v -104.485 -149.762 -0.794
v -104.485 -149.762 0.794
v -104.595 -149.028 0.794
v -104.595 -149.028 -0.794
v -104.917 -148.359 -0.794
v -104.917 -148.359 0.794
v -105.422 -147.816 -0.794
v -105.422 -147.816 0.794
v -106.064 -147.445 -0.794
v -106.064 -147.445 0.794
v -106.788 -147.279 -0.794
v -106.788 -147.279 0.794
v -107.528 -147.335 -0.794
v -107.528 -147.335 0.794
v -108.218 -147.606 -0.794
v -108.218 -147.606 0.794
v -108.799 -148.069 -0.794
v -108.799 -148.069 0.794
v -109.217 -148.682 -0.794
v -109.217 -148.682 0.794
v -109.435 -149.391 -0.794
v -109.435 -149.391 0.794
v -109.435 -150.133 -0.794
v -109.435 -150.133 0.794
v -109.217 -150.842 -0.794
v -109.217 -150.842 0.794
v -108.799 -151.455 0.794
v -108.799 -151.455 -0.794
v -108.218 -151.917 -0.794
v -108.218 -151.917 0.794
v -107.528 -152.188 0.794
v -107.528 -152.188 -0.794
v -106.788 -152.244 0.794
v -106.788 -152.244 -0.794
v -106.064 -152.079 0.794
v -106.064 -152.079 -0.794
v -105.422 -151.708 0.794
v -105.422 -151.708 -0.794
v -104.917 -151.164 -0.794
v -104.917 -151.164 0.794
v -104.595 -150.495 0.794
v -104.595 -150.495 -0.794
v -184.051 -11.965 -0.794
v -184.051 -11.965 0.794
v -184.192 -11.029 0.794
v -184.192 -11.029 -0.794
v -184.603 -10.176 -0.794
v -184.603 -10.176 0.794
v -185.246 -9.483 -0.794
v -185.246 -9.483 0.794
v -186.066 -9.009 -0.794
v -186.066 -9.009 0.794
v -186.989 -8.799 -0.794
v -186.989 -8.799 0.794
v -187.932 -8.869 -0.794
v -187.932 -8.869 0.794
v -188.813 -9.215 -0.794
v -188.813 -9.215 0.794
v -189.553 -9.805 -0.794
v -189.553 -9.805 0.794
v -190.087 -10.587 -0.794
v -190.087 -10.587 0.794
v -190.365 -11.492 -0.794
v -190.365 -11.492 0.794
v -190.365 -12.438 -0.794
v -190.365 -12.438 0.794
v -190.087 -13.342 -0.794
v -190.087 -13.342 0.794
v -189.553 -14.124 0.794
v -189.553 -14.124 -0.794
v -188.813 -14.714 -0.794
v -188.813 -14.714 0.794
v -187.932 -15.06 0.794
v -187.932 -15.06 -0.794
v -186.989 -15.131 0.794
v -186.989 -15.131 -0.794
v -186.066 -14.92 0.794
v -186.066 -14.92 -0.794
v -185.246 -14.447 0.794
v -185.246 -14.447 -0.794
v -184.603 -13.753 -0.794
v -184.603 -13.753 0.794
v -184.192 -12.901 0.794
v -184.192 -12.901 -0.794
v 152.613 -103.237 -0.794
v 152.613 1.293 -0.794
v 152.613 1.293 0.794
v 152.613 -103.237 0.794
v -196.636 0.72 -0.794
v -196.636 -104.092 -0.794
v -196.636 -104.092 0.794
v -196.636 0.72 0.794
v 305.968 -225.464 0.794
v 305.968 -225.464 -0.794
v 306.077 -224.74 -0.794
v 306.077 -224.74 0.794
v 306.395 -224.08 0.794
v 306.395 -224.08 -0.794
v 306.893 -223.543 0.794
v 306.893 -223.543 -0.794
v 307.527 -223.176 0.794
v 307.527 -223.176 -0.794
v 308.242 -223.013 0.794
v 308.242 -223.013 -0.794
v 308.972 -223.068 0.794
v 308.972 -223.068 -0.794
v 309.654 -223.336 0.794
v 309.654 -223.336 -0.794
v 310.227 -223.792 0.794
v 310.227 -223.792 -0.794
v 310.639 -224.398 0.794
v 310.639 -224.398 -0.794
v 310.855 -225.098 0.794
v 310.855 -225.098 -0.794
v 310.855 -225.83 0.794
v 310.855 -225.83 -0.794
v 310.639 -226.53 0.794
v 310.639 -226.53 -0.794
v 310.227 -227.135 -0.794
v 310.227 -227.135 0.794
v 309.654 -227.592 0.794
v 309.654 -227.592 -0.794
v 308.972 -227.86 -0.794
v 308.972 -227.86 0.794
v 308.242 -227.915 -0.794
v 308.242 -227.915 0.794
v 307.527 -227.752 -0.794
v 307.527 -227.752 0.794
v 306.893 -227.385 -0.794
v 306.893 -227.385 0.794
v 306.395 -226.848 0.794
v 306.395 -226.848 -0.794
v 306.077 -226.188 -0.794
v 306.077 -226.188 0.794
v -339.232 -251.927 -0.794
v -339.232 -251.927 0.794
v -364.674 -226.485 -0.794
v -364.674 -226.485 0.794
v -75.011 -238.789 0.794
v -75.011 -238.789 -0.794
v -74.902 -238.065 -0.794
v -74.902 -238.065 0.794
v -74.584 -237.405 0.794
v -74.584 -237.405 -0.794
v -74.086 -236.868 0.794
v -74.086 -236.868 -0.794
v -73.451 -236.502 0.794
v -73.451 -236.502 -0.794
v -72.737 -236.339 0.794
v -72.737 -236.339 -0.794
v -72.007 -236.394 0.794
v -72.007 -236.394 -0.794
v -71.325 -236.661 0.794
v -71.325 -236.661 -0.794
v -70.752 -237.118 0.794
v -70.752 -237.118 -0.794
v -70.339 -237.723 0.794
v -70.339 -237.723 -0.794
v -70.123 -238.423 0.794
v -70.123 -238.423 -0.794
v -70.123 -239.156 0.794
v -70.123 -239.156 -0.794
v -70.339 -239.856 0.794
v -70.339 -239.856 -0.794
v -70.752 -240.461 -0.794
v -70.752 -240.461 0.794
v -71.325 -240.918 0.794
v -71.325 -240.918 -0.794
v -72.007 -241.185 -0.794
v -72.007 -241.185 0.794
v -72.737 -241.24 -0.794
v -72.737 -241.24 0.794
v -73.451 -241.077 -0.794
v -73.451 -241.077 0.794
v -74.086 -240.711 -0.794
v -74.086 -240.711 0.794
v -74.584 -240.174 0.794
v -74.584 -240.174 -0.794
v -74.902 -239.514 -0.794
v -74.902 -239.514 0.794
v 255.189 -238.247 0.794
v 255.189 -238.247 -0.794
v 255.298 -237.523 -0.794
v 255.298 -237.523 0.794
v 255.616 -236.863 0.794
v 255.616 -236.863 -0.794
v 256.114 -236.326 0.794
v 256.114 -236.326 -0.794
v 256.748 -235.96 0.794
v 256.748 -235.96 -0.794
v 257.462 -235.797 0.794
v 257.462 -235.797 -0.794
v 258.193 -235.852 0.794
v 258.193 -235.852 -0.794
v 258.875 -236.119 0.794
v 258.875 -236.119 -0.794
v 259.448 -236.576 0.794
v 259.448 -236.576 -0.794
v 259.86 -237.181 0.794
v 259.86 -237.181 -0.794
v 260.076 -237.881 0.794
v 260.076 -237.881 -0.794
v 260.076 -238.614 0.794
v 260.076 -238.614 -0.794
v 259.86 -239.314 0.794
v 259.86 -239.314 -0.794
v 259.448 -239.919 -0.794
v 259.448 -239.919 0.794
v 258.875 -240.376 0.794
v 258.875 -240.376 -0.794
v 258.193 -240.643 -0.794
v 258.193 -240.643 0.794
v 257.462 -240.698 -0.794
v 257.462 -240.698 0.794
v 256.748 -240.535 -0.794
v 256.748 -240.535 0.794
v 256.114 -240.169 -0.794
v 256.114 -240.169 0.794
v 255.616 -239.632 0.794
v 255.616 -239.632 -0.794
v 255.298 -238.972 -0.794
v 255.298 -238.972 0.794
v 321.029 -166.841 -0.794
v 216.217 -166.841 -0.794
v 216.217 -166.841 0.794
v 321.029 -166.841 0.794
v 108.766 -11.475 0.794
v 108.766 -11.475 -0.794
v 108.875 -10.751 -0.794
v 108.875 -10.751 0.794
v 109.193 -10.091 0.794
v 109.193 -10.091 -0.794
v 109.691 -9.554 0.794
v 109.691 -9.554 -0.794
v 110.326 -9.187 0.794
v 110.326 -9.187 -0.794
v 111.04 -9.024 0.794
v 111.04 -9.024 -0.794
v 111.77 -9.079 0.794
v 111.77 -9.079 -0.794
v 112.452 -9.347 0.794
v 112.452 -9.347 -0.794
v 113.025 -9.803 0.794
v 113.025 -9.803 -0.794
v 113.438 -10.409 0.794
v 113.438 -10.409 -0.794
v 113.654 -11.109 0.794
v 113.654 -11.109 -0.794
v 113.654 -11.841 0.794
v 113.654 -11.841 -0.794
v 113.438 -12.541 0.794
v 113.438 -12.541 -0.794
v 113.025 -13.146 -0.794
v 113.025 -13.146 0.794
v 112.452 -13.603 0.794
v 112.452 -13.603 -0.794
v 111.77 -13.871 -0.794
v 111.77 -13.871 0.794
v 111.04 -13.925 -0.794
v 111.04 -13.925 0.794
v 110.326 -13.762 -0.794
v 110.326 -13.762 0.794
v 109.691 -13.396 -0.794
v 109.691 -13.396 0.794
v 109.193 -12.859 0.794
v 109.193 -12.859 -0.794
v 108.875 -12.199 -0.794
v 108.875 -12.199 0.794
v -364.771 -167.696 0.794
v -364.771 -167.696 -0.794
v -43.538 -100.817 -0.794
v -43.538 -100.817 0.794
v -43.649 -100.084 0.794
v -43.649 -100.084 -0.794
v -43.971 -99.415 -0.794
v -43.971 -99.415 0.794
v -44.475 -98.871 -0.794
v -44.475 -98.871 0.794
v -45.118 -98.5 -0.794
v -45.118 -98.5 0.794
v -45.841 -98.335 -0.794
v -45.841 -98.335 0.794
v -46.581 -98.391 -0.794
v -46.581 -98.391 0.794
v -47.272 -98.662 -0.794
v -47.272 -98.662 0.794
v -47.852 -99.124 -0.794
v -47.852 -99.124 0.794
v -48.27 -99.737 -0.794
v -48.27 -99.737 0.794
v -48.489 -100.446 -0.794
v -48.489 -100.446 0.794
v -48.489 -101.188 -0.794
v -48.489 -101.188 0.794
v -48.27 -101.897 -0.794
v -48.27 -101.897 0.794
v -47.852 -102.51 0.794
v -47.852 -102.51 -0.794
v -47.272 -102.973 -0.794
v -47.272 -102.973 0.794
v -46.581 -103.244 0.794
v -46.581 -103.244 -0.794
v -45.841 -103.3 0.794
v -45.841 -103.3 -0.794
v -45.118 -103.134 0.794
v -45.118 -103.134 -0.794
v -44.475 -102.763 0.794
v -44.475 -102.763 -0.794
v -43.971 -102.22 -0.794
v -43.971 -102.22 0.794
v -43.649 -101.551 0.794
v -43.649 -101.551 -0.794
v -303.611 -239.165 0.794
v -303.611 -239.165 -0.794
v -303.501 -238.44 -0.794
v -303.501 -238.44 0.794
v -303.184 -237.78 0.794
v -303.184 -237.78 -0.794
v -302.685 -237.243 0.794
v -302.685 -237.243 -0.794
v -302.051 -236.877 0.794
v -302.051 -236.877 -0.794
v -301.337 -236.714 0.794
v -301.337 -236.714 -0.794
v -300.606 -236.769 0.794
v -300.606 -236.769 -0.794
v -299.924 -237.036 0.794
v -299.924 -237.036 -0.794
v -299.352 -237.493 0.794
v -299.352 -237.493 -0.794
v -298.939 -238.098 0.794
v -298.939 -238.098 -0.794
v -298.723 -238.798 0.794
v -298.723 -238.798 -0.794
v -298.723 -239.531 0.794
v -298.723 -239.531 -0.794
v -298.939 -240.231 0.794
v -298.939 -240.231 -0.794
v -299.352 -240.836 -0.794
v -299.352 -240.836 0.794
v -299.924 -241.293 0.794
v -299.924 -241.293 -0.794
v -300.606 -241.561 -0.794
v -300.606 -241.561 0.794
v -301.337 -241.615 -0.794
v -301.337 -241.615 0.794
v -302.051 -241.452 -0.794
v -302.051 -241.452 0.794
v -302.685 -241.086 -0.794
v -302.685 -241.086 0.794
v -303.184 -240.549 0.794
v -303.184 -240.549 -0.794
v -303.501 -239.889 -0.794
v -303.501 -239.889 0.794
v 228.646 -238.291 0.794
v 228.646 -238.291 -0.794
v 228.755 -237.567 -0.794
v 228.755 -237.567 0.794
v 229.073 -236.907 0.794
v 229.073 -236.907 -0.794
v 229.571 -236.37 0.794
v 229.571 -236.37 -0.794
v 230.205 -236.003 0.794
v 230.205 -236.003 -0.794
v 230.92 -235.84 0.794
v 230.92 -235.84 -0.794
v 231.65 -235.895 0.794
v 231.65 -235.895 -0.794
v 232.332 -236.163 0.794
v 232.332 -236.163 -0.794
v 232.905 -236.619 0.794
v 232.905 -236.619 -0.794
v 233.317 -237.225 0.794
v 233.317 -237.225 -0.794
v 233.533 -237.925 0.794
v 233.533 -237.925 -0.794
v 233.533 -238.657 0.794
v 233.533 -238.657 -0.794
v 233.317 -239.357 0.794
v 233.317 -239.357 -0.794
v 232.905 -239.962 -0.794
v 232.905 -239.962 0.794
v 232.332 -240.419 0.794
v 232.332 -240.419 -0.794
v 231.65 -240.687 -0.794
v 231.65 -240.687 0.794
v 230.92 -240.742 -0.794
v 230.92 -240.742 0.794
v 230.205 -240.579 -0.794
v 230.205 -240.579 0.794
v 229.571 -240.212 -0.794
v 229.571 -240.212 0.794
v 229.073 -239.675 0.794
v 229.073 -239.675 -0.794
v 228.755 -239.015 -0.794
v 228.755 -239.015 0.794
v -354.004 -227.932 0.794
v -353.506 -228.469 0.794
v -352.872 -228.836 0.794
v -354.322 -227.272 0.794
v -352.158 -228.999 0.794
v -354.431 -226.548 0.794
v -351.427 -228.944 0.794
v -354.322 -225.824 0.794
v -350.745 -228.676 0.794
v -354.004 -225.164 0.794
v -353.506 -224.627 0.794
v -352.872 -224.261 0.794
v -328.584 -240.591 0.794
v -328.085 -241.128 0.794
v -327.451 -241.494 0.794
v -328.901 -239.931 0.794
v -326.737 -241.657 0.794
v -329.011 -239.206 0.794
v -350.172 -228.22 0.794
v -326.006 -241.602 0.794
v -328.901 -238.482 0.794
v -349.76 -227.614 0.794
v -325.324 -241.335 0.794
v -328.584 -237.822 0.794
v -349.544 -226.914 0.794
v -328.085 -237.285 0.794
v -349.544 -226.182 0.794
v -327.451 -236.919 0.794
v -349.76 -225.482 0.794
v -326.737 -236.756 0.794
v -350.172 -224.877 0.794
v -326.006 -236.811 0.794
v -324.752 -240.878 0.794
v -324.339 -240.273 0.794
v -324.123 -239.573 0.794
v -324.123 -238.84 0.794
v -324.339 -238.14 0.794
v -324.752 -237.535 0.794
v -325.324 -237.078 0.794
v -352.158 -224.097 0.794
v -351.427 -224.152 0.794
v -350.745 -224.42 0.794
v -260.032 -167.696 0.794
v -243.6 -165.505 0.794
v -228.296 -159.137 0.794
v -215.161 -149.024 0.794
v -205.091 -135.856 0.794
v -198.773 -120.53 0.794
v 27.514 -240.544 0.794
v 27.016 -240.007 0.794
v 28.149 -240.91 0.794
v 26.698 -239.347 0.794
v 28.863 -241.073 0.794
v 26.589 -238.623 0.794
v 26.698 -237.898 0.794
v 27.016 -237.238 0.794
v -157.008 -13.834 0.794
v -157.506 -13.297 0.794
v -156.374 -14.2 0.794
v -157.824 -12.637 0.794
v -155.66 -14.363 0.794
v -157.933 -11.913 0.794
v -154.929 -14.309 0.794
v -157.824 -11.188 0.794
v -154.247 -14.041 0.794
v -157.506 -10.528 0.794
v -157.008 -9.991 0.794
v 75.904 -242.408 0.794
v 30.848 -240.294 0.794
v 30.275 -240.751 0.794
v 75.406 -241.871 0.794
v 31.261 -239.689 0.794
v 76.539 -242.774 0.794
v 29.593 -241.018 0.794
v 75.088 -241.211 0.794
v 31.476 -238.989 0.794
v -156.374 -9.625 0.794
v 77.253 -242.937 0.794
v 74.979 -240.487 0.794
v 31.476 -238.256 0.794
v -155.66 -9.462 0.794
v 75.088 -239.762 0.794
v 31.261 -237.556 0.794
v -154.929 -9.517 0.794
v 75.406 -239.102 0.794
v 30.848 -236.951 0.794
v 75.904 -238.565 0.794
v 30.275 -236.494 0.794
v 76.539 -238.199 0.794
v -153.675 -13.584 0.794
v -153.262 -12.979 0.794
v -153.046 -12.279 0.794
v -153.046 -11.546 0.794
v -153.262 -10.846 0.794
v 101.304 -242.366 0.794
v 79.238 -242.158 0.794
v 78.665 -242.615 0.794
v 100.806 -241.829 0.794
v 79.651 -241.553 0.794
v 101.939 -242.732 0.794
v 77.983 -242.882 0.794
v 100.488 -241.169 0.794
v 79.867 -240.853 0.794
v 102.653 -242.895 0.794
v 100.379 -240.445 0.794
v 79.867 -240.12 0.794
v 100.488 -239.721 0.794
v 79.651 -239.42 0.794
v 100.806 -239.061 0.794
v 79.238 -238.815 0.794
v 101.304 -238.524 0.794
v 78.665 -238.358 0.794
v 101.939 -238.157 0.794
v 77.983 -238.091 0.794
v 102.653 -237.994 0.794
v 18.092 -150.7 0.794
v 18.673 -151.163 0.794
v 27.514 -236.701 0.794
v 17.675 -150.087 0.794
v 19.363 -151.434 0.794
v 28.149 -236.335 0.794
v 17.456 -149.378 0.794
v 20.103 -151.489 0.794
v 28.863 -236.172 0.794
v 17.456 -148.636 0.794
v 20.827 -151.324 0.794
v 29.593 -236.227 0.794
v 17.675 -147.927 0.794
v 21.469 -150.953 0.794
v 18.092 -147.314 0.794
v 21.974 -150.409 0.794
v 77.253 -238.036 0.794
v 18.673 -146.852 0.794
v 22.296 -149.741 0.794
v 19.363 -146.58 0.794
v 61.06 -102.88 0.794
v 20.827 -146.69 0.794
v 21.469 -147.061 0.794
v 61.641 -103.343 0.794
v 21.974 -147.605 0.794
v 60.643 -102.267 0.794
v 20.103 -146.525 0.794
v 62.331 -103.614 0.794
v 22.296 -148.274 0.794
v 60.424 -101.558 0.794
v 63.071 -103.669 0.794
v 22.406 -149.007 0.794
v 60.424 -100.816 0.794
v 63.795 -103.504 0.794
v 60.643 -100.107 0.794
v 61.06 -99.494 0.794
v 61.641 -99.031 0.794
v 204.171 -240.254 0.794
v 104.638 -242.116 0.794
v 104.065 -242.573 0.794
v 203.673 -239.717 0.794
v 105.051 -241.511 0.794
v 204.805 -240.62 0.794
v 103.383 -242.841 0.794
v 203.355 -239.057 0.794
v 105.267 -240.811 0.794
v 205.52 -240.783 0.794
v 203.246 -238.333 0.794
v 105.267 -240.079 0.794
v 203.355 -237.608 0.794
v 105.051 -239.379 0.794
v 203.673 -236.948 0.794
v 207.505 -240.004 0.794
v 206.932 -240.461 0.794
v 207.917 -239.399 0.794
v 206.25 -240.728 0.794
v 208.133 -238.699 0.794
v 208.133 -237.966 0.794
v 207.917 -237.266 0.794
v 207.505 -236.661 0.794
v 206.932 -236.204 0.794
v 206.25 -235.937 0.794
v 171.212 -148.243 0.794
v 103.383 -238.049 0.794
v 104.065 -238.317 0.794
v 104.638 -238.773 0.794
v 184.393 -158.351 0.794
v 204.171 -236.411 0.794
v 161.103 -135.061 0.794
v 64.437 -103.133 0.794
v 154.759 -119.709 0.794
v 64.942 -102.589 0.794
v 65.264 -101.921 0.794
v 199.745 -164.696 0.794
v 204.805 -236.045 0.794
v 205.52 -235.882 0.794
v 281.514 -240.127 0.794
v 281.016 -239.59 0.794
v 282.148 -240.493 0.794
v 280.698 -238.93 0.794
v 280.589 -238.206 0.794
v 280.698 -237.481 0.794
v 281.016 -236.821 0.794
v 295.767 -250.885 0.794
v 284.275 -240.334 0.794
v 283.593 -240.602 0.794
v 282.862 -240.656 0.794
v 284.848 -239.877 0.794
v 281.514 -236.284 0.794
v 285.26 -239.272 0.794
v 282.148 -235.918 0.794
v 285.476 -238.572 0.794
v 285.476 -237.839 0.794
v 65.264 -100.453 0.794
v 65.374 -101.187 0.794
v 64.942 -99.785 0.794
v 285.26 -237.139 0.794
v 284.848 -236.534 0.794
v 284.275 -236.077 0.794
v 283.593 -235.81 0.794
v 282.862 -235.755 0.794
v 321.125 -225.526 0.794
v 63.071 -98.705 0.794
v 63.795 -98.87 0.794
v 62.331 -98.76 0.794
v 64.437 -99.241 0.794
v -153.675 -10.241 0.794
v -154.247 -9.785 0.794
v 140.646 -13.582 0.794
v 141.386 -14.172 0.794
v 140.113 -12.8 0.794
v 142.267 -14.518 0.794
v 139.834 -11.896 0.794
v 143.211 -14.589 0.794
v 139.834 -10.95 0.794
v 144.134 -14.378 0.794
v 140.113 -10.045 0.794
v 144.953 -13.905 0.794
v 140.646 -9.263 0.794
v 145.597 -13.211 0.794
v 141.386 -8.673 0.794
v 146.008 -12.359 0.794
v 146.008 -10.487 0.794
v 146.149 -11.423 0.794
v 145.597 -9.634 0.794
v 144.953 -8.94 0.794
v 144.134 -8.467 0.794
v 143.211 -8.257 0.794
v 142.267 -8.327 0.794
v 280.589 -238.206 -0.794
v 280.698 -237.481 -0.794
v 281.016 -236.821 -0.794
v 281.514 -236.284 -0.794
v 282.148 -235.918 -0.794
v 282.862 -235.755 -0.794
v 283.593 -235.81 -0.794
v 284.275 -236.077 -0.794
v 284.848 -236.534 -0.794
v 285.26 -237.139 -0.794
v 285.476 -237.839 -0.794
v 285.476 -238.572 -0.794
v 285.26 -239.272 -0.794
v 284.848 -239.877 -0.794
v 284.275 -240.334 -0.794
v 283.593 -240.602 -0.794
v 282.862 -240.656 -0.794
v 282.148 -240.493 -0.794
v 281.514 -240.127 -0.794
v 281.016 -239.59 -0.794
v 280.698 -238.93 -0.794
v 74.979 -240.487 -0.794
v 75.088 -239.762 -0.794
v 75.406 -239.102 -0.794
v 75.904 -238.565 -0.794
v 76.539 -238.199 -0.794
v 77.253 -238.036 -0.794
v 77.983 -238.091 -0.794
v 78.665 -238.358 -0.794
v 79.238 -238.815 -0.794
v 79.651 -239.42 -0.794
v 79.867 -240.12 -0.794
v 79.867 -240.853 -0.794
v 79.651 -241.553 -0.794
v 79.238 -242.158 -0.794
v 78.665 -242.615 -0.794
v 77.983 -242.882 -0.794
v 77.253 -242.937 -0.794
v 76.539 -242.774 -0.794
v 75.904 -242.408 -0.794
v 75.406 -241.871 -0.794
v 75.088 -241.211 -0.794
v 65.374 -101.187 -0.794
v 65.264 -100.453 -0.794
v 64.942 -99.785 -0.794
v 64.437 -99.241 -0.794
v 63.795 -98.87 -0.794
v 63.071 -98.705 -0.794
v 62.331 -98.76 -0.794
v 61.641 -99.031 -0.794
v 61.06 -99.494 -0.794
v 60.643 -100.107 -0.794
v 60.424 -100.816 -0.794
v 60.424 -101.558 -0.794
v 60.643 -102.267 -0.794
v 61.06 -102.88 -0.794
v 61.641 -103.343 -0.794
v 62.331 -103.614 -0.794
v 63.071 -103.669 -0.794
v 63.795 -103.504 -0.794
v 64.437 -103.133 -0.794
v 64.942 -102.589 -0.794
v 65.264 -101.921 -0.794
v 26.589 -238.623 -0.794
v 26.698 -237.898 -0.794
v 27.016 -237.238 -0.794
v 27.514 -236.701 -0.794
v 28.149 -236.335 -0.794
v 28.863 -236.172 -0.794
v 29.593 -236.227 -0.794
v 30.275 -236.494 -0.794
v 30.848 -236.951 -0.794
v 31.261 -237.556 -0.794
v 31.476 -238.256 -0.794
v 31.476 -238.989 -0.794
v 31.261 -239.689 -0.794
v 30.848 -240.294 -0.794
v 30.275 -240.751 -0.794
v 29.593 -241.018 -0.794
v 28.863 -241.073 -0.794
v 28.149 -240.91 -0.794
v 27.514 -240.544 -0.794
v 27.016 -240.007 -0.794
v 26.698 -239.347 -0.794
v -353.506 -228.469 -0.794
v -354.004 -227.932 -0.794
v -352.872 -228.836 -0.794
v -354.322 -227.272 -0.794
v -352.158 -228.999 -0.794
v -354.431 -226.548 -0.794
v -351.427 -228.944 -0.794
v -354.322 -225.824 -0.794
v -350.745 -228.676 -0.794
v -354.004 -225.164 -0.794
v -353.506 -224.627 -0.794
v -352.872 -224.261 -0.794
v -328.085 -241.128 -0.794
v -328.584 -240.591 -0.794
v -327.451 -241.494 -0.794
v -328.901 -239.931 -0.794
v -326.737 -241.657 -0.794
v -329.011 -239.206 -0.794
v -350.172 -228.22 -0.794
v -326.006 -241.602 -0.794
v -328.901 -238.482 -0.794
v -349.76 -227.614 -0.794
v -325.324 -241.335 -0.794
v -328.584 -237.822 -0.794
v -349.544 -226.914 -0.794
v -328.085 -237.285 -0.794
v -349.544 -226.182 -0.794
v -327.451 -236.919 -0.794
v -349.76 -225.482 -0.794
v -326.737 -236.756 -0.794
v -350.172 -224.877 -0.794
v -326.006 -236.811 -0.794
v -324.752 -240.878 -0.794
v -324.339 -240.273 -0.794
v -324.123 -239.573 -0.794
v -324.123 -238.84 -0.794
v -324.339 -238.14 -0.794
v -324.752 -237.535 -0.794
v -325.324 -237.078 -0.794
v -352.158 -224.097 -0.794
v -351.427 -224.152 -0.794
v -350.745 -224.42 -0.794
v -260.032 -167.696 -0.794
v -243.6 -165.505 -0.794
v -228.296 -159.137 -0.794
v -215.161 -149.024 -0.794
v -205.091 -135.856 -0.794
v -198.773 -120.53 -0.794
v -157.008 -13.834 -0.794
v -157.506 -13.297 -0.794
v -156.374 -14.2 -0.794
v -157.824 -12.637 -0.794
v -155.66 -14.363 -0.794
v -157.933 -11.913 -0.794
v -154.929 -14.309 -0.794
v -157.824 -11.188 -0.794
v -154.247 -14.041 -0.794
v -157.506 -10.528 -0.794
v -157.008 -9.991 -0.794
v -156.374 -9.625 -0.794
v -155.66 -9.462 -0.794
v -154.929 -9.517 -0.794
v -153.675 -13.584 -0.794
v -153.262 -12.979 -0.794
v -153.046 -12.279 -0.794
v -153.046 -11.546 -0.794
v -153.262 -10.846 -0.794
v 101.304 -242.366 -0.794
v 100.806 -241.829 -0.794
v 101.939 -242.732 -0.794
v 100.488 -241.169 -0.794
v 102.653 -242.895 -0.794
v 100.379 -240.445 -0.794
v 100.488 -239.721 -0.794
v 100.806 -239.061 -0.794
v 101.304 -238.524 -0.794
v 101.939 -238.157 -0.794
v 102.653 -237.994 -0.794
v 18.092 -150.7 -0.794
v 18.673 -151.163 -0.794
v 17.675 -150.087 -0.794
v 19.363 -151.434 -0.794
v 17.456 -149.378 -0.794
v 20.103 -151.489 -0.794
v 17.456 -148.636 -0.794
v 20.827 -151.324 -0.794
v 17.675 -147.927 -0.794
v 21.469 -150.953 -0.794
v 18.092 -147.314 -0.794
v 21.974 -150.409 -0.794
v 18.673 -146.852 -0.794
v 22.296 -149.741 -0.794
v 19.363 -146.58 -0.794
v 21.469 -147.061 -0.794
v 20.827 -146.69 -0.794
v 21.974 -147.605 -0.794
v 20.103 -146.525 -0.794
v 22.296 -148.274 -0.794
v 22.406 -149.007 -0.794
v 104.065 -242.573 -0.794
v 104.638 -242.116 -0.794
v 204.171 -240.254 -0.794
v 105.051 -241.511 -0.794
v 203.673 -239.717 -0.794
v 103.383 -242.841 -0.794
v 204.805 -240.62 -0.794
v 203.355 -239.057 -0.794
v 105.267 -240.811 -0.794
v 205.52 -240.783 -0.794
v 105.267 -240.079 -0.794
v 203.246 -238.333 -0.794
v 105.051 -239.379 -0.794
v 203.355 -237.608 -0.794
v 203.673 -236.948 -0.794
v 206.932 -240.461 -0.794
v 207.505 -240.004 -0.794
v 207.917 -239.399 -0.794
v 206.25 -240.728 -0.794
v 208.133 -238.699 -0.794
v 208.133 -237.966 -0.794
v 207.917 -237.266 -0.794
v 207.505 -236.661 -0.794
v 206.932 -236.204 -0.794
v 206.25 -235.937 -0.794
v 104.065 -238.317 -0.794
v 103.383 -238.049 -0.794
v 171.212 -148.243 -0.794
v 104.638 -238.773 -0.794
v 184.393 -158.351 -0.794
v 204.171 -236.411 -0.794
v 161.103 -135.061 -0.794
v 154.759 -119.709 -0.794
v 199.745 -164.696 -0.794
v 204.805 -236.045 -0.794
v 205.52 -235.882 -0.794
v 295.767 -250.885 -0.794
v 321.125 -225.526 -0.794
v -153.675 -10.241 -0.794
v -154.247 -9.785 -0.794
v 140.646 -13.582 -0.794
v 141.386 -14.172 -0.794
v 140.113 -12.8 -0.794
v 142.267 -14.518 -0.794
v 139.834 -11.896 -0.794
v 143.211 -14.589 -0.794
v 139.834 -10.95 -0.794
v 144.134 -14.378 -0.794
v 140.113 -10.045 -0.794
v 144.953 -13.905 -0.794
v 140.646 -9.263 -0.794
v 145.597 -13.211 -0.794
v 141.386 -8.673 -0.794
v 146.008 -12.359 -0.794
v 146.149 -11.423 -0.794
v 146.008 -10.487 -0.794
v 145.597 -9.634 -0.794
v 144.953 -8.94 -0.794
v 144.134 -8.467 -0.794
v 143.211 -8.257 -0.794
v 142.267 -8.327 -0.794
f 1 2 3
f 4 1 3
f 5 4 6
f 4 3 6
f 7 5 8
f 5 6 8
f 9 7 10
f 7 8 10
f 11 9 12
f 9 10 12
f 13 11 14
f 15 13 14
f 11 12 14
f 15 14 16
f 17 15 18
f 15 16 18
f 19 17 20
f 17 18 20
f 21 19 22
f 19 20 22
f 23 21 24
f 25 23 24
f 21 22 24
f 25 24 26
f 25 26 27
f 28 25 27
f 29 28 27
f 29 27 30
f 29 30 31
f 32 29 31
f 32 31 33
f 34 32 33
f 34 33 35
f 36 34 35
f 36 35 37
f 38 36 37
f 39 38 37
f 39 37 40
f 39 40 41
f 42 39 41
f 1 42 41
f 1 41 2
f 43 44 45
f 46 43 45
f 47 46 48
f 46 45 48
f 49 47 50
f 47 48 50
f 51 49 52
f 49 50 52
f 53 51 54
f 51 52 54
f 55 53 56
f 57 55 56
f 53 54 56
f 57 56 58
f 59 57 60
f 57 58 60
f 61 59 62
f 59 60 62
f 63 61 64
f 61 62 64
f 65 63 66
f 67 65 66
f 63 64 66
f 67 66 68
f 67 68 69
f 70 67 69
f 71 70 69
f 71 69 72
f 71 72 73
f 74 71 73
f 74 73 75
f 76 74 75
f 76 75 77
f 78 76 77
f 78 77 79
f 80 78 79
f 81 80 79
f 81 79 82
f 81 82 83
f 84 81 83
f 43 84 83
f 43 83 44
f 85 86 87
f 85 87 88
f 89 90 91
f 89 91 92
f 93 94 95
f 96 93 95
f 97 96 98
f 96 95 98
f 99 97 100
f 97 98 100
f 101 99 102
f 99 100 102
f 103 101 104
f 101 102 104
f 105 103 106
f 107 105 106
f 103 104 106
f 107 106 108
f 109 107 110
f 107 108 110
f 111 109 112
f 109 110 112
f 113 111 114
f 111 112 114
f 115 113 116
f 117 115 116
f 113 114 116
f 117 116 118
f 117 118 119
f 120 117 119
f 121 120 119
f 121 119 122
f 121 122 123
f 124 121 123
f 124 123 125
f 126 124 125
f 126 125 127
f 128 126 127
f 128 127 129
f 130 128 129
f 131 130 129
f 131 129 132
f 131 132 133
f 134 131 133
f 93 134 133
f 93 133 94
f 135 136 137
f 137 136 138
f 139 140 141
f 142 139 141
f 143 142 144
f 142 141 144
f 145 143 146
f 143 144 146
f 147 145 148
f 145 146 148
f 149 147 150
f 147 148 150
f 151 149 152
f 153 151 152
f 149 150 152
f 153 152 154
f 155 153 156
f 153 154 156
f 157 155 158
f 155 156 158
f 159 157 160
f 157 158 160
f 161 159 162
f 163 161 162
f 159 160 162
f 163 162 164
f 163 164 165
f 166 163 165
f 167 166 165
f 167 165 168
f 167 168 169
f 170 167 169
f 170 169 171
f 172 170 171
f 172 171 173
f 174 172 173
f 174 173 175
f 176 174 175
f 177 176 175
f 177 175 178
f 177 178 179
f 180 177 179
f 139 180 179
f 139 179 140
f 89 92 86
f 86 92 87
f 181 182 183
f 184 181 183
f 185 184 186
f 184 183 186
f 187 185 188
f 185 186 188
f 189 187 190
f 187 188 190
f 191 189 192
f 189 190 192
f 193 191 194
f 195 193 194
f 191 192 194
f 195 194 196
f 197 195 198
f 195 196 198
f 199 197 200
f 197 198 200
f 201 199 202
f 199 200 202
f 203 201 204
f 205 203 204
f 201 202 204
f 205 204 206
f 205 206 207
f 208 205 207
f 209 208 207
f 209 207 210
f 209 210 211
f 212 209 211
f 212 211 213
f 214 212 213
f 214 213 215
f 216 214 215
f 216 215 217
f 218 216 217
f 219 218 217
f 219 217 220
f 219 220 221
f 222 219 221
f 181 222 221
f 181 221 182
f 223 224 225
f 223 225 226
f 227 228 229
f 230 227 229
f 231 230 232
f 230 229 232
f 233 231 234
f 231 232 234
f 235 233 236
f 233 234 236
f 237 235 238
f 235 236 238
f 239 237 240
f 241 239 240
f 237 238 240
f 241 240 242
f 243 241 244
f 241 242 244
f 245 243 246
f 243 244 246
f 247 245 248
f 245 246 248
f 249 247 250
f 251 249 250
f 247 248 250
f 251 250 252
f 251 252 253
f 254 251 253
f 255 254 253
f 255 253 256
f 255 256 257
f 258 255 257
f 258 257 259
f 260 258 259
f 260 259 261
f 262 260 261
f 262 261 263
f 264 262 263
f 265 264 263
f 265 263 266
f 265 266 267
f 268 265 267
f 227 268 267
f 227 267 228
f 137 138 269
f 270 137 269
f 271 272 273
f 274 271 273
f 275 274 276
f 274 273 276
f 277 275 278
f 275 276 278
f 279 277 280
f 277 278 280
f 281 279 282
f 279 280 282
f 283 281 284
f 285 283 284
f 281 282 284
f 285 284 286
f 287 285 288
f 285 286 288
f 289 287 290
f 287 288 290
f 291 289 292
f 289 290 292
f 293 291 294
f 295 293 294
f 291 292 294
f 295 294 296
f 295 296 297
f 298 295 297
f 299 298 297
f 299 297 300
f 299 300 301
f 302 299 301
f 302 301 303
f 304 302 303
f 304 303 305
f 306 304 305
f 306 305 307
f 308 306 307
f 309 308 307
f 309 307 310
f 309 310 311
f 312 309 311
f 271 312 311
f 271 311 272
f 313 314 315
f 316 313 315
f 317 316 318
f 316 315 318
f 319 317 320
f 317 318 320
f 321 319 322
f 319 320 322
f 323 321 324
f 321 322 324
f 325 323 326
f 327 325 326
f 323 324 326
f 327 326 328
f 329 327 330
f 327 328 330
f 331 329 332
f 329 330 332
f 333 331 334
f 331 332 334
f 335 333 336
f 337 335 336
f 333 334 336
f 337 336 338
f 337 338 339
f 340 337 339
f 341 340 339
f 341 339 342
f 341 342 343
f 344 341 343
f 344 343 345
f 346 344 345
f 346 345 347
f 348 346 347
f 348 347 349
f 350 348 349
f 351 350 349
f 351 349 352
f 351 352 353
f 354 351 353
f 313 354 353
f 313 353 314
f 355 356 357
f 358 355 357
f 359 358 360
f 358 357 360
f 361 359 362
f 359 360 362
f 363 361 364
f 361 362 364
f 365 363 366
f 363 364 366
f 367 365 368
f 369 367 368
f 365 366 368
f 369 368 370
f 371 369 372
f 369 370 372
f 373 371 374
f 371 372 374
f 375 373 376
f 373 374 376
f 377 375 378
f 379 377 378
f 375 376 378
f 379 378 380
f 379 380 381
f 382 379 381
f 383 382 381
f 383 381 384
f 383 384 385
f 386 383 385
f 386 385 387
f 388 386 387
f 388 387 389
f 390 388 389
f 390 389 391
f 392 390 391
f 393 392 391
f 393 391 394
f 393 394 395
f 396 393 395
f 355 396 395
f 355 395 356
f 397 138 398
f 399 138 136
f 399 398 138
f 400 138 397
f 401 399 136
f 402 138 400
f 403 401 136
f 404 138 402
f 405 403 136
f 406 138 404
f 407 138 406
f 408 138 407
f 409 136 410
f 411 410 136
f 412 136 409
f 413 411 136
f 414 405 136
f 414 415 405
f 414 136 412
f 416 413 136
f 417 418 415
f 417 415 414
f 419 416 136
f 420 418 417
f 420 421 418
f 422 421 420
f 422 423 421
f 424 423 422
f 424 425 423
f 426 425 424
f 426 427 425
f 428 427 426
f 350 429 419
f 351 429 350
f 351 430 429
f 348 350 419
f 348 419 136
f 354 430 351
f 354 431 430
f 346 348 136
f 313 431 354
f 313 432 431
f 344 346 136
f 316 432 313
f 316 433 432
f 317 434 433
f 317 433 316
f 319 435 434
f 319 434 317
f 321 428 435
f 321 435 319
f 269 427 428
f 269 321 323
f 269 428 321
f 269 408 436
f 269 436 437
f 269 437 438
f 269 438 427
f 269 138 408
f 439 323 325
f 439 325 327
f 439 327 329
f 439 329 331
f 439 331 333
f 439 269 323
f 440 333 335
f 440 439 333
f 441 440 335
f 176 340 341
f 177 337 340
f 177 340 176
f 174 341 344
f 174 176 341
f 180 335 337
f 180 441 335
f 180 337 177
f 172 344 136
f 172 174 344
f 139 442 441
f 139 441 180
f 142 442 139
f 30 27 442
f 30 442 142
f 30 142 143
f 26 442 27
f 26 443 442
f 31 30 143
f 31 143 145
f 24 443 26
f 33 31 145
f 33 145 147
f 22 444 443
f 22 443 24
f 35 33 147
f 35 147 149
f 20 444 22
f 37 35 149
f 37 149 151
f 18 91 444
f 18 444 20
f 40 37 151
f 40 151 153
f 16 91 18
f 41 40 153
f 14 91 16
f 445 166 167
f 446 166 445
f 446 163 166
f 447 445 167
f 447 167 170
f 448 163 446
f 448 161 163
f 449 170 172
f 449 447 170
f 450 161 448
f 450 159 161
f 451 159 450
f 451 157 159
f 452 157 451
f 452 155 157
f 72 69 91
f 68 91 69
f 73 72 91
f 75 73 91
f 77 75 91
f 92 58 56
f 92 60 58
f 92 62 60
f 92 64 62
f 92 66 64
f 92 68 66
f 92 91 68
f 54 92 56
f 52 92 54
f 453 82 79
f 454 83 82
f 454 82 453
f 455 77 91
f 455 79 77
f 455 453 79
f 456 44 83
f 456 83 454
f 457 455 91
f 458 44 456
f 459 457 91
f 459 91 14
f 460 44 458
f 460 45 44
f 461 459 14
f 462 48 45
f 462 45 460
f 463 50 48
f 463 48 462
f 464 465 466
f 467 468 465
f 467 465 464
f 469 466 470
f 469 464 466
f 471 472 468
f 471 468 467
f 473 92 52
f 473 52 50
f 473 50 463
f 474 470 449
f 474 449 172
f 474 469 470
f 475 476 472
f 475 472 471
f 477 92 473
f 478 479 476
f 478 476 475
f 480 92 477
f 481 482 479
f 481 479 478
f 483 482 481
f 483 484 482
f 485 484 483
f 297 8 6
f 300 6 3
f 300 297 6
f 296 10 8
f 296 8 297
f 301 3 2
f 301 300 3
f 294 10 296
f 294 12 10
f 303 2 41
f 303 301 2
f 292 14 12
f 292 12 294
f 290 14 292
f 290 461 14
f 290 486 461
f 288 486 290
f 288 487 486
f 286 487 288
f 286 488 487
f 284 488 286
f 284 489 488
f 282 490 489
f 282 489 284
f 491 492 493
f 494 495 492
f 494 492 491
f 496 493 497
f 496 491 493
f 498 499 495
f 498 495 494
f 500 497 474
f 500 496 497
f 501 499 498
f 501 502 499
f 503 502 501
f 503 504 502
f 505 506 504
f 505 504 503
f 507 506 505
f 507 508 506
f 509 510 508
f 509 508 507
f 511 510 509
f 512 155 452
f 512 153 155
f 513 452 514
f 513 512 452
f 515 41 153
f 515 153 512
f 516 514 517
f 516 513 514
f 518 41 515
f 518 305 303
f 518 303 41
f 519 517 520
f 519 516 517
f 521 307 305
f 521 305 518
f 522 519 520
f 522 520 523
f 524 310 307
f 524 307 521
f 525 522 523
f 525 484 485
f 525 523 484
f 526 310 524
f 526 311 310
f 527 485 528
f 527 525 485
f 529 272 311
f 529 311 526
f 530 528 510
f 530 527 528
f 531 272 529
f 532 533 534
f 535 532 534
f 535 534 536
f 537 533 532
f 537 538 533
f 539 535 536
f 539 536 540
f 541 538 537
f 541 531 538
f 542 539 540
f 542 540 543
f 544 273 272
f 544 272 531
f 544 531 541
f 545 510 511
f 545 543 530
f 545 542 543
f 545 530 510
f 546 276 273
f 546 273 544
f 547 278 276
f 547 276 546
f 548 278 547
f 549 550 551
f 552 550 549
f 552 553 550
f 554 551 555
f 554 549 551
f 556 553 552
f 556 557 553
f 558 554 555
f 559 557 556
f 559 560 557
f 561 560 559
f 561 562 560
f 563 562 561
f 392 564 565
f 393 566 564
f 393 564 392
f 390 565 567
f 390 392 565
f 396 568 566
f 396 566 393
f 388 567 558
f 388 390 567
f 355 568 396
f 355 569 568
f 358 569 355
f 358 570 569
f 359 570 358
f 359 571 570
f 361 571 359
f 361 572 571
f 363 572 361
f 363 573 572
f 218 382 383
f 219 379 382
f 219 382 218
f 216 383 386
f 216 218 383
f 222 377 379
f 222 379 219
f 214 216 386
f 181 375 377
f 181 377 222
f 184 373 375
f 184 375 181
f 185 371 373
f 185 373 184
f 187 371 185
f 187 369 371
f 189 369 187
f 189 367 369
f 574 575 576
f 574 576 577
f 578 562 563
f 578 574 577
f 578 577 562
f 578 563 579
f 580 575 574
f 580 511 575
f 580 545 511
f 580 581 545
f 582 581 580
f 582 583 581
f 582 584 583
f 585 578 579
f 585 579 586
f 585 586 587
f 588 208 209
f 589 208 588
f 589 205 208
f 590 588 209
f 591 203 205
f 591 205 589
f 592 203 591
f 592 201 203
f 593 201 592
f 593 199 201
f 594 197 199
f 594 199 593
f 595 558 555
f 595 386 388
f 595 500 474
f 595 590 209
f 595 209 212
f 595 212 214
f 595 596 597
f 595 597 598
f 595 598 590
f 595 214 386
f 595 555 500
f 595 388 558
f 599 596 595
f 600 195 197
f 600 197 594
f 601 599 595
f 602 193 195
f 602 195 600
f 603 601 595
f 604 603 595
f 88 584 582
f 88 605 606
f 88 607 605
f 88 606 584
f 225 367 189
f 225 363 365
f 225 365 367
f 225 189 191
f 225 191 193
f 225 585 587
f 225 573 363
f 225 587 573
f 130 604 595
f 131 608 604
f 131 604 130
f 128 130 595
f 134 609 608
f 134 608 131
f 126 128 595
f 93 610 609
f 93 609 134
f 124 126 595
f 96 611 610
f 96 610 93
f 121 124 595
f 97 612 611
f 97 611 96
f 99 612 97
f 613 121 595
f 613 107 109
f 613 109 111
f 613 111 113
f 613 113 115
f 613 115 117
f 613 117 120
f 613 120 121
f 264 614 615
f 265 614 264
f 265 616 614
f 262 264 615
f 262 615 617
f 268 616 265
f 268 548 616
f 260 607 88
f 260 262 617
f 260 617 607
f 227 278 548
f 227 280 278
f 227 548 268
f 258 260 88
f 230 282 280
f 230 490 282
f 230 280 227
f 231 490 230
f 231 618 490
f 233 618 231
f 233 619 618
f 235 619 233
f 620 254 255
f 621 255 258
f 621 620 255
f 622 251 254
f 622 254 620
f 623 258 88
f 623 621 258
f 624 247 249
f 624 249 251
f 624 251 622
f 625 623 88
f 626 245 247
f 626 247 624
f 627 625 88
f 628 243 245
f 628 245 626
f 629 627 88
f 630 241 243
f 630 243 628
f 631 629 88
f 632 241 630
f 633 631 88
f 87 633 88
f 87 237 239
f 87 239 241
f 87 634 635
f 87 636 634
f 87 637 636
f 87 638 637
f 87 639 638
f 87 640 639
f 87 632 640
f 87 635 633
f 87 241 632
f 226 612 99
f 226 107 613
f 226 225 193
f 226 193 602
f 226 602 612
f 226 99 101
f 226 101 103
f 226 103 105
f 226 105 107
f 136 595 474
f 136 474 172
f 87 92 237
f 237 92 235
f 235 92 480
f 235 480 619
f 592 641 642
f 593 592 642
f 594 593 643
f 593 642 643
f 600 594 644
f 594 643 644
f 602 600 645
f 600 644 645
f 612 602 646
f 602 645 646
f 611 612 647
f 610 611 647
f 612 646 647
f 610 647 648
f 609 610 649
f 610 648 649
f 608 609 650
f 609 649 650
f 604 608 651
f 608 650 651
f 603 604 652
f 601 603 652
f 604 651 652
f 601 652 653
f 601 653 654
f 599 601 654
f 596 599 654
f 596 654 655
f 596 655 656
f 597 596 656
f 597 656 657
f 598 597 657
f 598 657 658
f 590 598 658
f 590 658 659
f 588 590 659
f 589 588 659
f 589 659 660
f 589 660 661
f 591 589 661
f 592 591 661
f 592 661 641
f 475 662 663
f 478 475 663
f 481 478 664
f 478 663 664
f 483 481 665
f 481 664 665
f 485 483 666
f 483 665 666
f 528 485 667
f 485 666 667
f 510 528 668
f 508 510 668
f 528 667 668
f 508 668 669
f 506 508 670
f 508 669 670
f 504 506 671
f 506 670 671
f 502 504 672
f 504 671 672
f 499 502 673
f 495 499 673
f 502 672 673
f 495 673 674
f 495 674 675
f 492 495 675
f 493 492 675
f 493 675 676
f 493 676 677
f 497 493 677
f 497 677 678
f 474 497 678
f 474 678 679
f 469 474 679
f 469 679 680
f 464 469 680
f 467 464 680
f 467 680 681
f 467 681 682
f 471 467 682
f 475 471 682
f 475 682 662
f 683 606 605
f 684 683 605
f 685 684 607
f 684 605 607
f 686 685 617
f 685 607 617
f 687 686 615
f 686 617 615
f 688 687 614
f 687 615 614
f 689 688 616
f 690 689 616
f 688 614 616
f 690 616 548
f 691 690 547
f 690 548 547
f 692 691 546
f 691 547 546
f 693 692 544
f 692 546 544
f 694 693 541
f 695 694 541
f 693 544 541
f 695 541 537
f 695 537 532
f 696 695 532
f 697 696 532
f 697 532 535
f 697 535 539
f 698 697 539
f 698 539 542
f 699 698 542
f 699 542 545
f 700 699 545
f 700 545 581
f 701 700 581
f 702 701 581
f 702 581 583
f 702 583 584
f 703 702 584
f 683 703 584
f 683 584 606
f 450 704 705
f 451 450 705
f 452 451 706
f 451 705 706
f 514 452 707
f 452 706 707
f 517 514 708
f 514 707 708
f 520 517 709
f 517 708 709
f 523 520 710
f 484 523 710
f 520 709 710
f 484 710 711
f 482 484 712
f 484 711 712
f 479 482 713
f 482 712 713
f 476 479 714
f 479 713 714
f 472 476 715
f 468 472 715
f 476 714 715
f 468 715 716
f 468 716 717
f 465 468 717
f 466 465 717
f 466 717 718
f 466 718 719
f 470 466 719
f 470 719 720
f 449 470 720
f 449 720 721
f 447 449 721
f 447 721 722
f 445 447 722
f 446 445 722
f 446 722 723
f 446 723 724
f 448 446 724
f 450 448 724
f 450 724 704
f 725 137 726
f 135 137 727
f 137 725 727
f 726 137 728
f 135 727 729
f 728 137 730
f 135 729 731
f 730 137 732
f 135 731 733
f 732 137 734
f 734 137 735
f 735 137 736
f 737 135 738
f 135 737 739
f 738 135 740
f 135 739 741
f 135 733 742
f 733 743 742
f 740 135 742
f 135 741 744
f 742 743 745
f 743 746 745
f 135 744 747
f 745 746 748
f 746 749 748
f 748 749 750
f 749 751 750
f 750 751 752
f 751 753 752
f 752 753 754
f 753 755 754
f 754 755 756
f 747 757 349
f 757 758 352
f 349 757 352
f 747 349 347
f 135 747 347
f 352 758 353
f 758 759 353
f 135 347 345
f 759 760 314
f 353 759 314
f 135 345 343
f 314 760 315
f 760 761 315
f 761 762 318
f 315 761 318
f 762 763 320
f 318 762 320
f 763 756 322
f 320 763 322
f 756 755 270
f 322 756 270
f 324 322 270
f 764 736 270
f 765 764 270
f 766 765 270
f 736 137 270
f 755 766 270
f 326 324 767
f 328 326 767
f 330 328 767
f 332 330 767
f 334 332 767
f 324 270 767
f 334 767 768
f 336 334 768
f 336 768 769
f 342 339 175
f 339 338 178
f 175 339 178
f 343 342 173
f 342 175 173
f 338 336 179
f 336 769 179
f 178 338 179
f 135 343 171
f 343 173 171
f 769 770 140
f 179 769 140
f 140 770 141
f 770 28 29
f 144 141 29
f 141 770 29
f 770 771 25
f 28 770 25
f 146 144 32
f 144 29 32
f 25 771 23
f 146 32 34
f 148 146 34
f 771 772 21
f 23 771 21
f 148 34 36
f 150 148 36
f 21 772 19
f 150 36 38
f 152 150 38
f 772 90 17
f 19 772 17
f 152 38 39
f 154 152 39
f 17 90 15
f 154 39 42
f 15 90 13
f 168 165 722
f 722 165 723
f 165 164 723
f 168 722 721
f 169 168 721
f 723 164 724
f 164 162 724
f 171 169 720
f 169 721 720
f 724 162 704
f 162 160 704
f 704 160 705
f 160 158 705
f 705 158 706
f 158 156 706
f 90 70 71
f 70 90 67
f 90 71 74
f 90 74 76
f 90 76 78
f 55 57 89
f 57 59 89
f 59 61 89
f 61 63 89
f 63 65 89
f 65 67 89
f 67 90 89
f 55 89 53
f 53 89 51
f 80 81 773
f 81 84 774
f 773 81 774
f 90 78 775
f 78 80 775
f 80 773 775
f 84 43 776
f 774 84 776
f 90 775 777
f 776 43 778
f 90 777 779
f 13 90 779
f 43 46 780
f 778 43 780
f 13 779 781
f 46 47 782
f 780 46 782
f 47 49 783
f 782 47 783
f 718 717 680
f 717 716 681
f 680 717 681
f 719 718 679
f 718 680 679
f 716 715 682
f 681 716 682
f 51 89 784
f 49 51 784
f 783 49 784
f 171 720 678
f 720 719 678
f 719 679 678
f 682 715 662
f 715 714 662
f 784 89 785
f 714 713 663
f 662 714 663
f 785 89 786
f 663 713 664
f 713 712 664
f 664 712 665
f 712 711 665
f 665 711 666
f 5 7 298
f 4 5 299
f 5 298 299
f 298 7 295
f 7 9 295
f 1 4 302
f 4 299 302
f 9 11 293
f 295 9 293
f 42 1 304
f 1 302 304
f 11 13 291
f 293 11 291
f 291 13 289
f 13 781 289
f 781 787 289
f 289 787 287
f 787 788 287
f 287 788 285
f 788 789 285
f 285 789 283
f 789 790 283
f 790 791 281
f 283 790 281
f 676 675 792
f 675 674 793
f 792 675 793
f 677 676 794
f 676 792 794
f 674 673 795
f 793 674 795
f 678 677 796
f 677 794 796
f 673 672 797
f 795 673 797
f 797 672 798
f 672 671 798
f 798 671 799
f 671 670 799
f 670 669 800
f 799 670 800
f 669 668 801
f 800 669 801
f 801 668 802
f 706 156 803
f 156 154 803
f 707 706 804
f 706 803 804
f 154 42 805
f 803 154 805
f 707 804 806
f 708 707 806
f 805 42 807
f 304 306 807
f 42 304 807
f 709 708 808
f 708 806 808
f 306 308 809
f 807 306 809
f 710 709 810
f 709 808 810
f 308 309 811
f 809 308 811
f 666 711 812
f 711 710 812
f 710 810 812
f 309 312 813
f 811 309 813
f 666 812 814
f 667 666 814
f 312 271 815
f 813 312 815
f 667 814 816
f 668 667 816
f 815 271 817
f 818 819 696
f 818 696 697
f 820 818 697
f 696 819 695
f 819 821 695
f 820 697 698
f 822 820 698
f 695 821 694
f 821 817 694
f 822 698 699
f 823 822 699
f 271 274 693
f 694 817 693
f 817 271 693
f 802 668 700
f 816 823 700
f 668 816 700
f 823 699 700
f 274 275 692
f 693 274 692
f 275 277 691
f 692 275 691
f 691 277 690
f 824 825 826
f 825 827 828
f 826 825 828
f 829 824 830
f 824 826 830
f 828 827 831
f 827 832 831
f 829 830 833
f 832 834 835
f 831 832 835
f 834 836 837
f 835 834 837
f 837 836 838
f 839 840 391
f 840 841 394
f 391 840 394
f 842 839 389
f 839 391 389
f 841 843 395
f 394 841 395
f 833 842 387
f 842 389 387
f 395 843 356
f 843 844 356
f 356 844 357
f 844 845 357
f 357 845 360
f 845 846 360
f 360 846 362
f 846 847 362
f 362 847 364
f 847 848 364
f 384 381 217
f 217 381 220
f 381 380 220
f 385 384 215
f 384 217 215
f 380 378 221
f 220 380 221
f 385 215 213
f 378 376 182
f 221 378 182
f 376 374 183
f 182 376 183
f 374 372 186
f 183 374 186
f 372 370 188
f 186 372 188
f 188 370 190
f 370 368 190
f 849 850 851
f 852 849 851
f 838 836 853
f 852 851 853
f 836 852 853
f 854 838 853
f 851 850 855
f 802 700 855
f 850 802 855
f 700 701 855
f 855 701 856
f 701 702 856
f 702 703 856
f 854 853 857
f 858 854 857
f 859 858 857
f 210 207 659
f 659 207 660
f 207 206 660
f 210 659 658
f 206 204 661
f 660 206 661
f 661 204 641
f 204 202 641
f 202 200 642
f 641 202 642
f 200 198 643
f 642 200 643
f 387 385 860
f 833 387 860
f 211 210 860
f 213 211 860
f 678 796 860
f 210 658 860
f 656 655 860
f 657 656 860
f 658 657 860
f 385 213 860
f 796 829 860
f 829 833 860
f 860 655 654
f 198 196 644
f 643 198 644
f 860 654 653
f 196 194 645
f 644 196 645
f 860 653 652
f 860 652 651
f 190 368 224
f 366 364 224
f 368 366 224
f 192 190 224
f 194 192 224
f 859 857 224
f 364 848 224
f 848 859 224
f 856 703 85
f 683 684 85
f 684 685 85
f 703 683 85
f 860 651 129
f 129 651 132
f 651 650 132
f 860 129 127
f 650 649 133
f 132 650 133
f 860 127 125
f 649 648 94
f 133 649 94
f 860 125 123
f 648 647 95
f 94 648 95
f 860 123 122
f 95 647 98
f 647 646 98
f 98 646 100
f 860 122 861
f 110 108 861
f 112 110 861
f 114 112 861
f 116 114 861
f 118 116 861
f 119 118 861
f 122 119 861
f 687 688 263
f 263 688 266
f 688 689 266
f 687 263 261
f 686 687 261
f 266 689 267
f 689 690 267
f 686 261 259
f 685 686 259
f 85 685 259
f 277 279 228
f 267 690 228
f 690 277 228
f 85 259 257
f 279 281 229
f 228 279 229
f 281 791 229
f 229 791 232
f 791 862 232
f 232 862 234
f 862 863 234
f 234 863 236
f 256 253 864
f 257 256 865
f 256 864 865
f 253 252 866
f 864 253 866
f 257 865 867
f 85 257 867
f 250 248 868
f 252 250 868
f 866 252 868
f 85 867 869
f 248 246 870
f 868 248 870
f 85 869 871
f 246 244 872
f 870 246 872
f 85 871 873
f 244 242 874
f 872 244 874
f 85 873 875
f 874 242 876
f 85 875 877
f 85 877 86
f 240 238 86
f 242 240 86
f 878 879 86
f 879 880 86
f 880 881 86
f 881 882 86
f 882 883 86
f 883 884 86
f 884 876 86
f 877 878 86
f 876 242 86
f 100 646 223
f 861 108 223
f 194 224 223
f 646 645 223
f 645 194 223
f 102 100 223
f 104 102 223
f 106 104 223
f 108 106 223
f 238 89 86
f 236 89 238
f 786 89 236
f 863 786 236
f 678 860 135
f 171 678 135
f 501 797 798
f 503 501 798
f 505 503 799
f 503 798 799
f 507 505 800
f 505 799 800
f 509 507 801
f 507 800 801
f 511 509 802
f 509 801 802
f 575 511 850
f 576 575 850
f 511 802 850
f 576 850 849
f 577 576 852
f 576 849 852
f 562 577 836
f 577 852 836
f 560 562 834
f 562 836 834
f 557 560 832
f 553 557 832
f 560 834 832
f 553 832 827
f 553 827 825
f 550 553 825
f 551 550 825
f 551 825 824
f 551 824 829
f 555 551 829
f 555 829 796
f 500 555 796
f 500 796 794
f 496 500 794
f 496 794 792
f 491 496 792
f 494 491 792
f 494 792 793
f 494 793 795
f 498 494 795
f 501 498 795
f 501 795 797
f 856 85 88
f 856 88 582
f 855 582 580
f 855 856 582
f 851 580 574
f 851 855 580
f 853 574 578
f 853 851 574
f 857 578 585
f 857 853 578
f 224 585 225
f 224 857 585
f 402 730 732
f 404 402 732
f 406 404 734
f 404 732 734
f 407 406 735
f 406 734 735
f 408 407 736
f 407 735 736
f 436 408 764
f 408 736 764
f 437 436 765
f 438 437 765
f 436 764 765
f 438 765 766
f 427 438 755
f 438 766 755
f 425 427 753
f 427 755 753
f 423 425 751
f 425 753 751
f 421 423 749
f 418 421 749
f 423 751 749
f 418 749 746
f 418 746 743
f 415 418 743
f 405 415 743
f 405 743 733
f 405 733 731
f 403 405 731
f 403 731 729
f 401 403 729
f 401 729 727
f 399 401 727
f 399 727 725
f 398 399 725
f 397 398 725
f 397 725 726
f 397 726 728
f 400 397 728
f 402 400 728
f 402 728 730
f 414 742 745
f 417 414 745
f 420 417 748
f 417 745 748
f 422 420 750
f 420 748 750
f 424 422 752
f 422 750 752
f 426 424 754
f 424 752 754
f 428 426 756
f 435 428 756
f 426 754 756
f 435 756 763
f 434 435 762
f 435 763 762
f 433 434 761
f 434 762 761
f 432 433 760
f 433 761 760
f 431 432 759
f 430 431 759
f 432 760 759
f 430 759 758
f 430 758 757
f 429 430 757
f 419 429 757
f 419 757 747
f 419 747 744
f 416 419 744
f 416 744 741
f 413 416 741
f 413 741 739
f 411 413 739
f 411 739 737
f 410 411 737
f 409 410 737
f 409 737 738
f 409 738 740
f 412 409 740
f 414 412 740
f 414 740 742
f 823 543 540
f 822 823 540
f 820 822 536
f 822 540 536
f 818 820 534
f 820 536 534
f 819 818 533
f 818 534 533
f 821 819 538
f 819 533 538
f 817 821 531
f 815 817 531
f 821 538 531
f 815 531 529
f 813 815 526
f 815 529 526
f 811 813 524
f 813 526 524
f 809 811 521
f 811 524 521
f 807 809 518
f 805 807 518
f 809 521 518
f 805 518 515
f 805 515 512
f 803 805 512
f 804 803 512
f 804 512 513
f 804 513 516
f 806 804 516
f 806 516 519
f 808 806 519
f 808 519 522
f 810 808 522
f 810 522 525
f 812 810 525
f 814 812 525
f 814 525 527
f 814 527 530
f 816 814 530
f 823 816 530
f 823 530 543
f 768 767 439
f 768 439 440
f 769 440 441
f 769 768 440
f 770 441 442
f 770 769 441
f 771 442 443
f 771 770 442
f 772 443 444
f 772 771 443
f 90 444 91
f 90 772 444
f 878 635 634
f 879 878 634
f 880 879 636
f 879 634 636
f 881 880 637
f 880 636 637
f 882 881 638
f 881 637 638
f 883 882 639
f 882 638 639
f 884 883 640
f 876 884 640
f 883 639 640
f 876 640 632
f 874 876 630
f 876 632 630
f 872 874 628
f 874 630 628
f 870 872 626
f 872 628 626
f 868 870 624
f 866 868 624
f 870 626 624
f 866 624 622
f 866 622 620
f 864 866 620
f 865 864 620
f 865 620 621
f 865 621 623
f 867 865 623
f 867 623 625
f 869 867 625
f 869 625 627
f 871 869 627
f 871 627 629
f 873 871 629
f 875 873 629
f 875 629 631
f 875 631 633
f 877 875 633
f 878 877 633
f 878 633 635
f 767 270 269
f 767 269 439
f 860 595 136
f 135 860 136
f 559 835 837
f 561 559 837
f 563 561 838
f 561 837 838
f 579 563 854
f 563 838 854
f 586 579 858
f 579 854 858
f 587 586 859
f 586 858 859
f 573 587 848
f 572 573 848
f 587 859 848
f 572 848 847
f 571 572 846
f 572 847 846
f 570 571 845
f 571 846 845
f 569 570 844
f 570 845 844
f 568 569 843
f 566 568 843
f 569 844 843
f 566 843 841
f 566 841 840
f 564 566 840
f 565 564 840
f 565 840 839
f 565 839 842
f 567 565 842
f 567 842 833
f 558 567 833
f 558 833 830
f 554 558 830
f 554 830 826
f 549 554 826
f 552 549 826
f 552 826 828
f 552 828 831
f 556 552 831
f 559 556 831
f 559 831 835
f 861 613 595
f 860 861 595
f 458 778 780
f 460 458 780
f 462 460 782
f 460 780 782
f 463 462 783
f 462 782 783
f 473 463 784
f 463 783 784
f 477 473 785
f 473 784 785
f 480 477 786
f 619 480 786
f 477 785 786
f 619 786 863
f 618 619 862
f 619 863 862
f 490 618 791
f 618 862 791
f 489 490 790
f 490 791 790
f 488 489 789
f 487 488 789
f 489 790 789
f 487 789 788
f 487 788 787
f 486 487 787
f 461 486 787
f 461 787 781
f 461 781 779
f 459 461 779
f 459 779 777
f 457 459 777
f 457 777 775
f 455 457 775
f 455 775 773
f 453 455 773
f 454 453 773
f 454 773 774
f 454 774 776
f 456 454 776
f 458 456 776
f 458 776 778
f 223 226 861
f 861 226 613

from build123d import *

# Parameters (mm, degrees)
SKETCH3_W                    = 914.4
SKETCH3_H                    = 609.6
BOSS_EXTRUDE1_DEPTH          = 0.79375
SKETCH4_OUTSIDE_W            = 1136.194
SKETCH4_OUTSIDE_H            = 831.394
CUT_EXTRUDE1_DEPTH           = 2.54
F_10_0_1935_DIAMETER_HOLE1_D = 4.9149
CUT_EXTRUDE5_DEPTH           = 2.54
CUT_EXTRUDE6_DEPTH           = 2.54
F_1_4_0_25_DIAMETER_HOLE1_D  = 6.35
F_10_CLEARANCE_HOLE1_D       = 4.9784


with BuildPart() as part:
    # Sketch3 → Boss-Extrude1 (new, symmetric)
    with BuildSketch(Plane.XY):
        Rectangle(SKETCH3_W, SKETCH3_H)
    extrude(amount=BOSS_EXTRUDE1_DEPTH, both=True)

    # Sketch4 outside → Cut-Extrude1 (cut)
    with BuildSketch(Plane.XY.offset(0.79375)):
        Rectangle(SKETCH4_OUTSIDE_W, SKETCH4_OUTSIDE_H)
        with BuildLine():
            Line((-362.506554298, 0.447439942), (318.21252852, 1.564886415))
            ThreePointArc((318.21252852, 1.564886415), (320.009798565, 0.823886977), (320.756694674, -0.970940586))
            Line((320.756694674, -0.970940586), (321.125317657, -225.526391983))
            Line((321.125317657, -225.526391983), (295.766909962, -250.884799679))
            Line((295.766909962, -250.884799679), (-339.232233443, -251.927193706))
            Line((-339.232233443, -251.927193706), (-364.674032102, -226.485395047))
            Line((-364.674032102, -226.485395047), (-365.0423813, -2.096726212))
            ThreePointArc((-365.0423813, -2.096726212), (-364.301381862, -0.299456167), (-362.506554298, 0.447439942))
        make_face(mode=Mode.SUBTRACT)
    extrude(amount=-CUT_EXTRUDE1_DEPTH, mode=Mode.SUBTRACT)

    # #10 (0.1935) Diameter Hole1 (through all)
    with Locations(Plane.XY.offset(0.79375)):
        with Locations((-301.153133674, -239.164667177), (-326.553099451, -239.206362941), (-351.97391311, -226.548075817), (-72.553441175, -238.789405326), (29.046421932, -238.622622281), (77.43654747, -240.486594059), (102.836513247, -240.444898294), (205.703184417, -238.332628273), (231.103150194, -238.290932508), (257.646113416, -238.247360435), (283.046079193, -238.205664671), (308.425197087, -225.463986018), (-155.475985843, -11.912722419), (111.223655321, -11.474916927)):
            Hole(F_10_0_1935_DIAMETER_HOLE1_D / 2)

    # Sketch13 → Cut-Extrude5 (cut)
    with BuildSketch(Plane(origin=(0, 0, -0.79375), x_dir=(-1, 0, 0), z_dir=(0, 0, -1))):
        with BuildLine():
            Line((-216.217386967, -166.841258451), (-343.254011981, -166.841258451))
            Line((-343.254011981, -166.841258451), (-342.941011359, 23.830509847))
            Line((-342.941011359, 23.830509847), (-152.613233115, 23.518073908))
            Line((-152.613233115, 23.518073908), (-152.613233115, -103.237104599))
            ThreePointArc((-152.613233115, -103.237104599), (-171.211866952, -148.242624615), (-216.217386967, -166.841258451))
        make_face()
    extrude(amount=-CUT_EXTRUDE5_DEPTH, mode=Mode.SUBTRACT)

    # Sketch12 → Cut-Extrude6 (cut)
    with BuildSketch(Plane(origin=(0, 0, -0.79375), x_dir=(-1, 0, 0), z_dir=(0, 0, -1))):
        with BuildLine():
            Line((196.636236426, -104.091867765), (196.636236426, 20.404753749))
            Line((196.636236426, 20.404753749), (384.763838571, 20.095930202))
            Line((384.763838571, 20.095930202), (384.455565363, -167.696021617))
            Line((384.455565363, -167.696021617), (260.031911457, -167.696021617))
            ThreePointArc((260.031911457, -167.696021617), (215.161222367, -149.023618888), (196.636236426, -104.091867765))
        make_face()
    extrude(amount=-CUT_EXTRUDE6_DEPTH, mode=Mode.SUBTRACT)

    # 1/4 (0.25) Diameter Hole1 (through all)
    with Locations(Plane(origin=(0, 0, -0.79375), x_dir=(-1, 0, 0), z_dir=(0, 0, -1))):
        with Locations((-142.973612542, -11.422797239), (187.225942556, -11.964842173)):
            Hole(F_1_4_0_25_DIAMETER_HOLE1_D / 2)

    # #10 Clearance Hole1 (through all)
    with Locations(Plane(origin=(0, 0, -0.79375), x_dir=(-1, 0, 0), z_dir=(0, 0, -1))):
        with Locations((-62.885205352, -101.186991996), (-19.917204705, -149.007237749), (46.027185416, -100.817324835), (106.973826127, -149.761638685)):
            Hole(F_10_CLEARANCE_HOLE1_D / 2)


solid = part.part
